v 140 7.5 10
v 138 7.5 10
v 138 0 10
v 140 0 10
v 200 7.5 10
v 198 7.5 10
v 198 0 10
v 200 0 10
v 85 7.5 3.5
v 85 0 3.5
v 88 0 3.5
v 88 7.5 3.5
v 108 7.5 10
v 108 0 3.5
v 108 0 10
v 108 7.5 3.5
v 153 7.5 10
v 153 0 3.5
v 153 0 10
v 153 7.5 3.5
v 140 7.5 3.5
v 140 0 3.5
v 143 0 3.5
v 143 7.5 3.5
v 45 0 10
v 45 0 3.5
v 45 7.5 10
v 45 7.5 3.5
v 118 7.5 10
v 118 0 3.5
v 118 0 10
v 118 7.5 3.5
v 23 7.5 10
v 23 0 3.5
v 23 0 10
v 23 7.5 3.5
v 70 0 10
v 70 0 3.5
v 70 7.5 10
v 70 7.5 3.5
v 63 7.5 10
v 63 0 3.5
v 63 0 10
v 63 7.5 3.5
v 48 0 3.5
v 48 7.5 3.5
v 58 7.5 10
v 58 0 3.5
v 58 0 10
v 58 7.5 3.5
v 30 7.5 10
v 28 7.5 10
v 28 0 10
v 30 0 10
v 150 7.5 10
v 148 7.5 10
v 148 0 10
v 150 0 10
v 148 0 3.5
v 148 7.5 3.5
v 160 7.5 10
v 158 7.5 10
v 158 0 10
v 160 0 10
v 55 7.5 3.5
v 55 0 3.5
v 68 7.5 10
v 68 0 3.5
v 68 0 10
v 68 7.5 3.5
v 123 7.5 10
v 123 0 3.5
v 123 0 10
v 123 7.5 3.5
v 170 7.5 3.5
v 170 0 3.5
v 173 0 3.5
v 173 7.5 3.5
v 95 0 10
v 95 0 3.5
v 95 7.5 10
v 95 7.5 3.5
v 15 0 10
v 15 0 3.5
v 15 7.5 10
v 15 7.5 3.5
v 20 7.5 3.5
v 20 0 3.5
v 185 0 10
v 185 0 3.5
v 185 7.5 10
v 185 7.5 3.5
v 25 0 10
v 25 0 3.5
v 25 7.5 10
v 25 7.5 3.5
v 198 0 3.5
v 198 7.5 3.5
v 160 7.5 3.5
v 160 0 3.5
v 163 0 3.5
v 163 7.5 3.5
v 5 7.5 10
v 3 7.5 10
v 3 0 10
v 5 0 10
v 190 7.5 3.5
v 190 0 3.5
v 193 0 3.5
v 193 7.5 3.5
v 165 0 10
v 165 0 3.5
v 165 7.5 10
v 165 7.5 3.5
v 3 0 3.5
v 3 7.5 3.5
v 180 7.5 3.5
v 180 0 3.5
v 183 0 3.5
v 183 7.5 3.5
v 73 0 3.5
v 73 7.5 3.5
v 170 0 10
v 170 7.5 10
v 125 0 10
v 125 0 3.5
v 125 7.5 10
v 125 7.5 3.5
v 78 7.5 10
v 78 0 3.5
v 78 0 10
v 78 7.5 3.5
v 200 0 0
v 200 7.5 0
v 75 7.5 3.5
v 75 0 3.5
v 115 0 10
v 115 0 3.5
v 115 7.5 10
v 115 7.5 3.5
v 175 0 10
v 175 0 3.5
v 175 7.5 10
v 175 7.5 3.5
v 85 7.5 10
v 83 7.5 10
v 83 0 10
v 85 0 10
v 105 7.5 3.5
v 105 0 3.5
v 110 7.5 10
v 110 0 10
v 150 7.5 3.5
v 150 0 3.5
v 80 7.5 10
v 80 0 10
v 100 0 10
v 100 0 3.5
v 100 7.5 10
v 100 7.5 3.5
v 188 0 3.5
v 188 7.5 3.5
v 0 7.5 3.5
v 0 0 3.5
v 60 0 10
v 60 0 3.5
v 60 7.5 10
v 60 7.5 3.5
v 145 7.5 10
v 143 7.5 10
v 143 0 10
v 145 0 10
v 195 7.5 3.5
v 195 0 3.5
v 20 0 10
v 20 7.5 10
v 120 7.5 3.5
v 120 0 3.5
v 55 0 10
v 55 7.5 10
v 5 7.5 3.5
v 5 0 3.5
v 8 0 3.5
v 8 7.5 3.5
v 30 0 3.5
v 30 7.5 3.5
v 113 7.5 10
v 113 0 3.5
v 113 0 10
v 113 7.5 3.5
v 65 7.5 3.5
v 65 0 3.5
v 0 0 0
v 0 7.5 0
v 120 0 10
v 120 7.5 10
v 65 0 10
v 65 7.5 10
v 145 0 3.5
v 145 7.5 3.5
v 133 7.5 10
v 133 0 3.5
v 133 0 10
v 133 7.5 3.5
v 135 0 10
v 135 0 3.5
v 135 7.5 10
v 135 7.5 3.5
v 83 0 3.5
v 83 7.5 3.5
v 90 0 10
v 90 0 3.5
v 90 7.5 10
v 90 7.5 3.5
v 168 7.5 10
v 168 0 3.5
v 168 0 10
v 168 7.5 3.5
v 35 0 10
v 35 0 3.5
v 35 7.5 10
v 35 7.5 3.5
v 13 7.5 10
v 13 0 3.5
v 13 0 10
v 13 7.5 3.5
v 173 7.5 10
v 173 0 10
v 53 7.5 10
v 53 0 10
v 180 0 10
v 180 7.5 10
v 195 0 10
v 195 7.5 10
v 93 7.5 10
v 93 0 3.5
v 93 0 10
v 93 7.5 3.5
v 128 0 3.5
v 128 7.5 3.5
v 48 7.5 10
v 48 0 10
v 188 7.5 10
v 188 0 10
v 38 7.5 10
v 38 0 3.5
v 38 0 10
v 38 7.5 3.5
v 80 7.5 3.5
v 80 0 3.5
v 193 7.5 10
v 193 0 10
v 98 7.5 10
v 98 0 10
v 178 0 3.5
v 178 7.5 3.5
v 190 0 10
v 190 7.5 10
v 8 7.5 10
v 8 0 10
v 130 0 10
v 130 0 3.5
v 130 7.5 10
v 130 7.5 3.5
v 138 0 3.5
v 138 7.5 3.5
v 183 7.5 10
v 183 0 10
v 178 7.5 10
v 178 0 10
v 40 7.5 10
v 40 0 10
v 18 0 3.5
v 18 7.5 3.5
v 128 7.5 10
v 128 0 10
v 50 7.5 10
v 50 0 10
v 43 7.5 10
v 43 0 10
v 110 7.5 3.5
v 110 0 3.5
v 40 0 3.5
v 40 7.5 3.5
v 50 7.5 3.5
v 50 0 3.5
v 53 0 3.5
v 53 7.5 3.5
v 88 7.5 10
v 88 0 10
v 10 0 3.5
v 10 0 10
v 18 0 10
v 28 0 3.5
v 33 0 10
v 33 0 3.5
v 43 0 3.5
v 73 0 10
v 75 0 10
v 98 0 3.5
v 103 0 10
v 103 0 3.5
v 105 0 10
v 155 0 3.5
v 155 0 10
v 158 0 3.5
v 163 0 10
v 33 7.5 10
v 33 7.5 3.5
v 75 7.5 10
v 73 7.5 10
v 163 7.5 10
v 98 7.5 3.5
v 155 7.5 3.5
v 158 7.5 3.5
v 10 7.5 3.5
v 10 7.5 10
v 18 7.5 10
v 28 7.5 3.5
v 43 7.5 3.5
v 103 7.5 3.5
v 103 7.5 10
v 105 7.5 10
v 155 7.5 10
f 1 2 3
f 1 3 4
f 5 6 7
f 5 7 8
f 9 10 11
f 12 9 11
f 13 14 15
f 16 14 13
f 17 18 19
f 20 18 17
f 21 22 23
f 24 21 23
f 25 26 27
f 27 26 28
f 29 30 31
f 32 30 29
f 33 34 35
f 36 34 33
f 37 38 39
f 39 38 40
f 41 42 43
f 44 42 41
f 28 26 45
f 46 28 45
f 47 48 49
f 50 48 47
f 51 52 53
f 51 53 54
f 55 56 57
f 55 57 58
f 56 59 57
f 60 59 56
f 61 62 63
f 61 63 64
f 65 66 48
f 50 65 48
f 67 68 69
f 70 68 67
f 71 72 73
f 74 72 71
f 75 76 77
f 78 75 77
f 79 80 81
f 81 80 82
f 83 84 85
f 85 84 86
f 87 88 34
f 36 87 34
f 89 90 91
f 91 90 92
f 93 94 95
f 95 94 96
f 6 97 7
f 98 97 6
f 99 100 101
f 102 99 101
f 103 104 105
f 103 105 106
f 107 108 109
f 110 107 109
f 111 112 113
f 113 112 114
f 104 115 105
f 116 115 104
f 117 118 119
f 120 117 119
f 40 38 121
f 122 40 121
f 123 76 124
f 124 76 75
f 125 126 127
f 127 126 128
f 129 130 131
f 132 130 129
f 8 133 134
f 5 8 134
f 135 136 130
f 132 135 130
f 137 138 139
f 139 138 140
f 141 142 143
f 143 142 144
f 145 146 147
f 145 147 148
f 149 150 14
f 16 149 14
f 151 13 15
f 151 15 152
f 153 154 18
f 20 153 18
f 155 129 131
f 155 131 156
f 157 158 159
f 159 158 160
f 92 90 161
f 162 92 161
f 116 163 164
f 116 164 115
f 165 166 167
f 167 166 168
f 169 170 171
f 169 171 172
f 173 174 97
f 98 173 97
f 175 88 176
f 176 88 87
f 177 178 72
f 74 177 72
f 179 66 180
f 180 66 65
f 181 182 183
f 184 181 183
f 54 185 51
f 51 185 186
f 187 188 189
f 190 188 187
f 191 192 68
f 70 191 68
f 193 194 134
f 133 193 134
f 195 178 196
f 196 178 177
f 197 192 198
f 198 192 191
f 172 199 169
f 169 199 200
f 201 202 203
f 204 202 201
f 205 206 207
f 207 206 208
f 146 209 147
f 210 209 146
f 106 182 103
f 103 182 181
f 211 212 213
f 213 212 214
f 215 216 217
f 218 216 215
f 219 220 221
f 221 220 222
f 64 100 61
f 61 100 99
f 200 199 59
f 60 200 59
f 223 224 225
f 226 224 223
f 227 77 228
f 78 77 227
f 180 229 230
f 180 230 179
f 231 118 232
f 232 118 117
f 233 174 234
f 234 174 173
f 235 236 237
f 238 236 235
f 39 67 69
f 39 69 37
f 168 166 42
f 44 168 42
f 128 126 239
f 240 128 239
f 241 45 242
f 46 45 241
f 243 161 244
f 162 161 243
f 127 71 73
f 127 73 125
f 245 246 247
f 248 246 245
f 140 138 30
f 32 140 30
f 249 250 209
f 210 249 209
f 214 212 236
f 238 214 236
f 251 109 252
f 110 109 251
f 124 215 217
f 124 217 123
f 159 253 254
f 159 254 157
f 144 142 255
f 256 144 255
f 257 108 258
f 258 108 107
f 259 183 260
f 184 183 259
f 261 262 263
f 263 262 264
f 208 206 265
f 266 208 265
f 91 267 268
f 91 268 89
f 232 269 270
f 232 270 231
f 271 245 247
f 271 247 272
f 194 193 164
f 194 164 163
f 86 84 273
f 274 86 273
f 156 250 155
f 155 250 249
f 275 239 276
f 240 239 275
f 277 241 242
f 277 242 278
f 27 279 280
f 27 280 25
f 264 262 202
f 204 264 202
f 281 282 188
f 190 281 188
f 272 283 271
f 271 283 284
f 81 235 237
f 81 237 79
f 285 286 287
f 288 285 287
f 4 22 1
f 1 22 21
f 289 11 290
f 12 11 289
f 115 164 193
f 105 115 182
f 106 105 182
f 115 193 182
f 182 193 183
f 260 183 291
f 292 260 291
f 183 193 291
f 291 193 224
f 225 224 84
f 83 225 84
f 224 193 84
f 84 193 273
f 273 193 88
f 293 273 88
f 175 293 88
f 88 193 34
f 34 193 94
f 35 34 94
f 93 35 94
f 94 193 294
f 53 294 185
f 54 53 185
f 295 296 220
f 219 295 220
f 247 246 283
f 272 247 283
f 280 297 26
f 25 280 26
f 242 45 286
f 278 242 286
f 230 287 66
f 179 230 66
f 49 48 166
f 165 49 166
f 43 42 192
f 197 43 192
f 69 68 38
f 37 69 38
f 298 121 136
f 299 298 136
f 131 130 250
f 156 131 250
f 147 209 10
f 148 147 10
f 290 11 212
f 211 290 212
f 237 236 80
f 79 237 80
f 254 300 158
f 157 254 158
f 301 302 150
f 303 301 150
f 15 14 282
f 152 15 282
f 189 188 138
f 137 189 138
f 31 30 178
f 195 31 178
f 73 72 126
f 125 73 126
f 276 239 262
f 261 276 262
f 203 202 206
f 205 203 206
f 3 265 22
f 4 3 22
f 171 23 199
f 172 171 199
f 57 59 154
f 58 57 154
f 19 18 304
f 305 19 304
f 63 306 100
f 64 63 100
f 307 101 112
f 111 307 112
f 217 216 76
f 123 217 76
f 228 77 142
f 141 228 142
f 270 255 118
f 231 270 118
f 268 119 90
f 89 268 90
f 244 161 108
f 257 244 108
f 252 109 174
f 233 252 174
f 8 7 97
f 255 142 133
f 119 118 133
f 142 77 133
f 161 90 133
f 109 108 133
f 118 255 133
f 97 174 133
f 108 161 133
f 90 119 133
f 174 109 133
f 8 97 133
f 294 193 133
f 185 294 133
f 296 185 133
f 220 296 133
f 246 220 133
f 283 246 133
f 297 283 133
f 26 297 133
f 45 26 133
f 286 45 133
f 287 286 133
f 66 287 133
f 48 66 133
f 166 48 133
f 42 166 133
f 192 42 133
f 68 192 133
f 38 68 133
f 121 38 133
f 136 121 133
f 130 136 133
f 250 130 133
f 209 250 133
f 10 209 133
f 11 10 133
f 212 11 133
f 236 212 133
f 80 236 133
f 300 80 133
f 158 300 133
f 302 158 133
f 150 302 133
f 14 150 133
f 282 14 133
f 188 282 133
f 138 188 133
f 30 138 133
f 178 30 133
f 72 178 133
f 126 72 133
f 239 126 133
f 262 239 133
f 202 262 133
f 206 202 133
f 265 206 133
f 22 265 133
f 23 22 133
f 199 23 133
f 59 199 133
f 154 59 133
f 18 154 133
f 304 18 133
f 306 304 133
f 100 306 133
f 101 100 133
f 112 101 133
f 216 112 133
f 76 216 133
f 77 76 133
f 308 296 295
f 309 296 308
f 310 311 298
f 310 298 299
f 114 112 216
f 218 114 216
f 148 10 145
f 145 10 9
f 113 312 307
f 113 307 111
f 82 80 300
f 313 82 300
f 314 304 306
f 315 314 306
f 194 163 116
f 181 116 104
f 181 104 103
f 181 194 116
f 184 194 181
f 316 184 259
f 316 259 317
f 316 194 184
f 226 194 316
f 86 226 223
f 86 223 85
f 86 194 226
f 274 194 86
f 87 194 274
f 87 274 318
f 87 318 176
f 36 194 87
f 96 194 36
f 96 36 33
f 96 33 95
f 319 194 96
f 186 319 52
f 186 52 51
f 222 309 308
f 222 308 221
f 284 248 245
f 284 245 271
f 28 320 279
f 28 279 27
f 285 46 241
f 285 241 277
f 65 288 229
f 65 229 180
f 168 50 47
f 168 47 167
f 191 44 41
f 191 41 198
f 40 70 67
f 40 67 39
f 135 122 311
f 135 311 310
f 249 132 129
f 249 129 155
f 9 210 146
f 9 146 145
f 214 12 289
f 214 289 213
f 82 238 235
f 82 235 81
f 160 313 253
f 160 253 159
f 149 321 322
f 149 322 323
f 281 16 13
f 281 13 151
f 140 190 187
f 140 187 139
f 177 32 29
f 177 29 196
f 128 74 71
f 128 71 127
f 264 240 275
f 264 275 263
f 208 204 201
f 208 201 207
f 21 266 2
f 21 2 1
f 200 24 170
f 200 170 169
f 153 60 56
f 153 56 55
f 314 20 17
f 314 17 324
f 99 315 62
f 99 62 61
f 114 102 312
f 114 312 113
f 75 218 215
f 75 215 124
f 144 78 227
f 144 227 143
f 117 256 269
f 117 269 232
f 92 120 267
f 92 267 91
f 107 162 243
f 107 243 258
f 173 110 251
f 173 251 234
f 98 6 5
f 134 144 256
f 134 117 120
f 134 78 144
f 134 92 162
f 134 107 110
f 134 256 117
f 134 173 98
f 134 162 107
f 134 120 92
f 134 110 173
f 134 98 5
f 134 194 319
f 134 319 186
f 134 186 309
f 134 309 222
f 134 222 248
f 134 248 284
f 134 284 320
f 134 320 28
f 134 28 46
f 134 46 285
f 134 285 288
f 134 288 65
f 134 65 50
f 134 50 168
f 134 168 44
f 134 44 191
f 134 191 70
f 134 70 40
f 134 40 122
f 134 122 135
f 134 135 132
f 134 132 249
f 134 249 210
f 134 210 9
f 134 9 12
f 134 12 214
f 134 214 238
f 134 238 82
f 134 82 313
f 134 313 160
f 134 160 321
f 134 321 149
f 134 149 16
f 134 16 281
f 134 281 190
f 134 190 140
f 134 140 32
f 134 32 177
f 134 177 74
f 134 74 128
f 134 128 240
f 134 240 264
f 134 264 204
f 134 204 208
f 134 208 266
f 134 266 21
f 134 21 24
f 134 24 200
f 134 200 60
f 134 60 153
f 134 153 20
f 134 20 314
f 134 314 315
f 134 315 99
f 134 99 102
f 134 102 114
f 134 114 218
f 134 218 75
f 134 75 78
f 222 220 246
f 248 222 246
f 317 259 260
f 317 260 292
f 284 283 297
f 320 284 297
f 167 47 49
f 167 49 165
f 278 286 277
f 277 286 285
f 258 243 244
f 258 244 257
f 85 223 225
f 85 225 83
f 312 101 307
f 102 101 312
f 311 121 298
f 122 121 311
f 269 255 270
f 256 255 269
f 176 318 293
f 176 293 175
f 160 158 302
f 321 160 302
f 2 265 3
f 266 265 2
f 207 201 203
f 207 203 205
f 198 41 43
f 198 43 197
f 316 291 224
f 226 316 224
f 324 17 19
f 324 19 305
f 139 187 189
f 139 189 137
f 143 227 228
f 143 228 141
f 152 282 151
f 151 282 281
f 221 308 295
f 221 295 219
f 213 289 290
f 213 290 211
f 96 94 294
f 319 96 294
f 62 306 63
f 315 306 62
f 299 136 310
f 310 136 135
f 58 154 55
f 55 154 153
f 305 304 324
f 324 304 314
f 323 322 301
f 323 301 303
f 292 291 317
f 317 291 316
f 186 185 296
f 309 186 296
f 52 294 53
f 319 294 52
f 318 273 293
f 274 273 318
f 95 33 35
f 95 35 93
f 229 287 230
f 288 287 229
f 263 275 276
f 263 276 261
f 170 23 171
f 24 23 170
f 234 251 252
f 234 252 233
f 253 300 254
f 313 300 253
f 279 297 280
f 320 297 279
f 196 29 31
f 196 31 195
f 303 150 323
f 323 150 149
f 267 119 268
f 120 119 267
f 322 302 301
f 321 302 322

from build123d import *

# Parameters (mm, degrees)
F0_W     = 3
F0_H     = 7.5
F1_DEPTH = 3.5
F0_W_2   = 2
F2_DEPTH = 10


with BuildPart() as f1:
    # F0 (on Top) → F1 (new body)
    with BuildSketch(Plane.XY):
        with Locations((1.5, 3.75)):
            Rectangle(F0_W, F0_H)
        with Locations((6.5, 3.75)):
            Rectangle(F0_W, F0_H)
        with Locations((11.5, 3.75)):
            Rectangle(F0_W, F0_H)
        with Locations((16.5, 3.75)):
            Rectangle(F0_W, F0_H)
        with Locations((21.5, 3.75)):
            Rectangle(F0_W, F0_H)
        with Locations((26.5, 3.75)):
            Rectangle(F0_W, F0_H)
        with Locations((31.5, 3.75)):
            Rectangle(F0_W, F0_H)
        with Locations((36.5, 3.75)):
            Rectangle(F0_W, F0_H)
        with Locations((41.5, 3.75)):
            Rectangle(F0_W, F0_H)
        with Locations((46.5, 3.75)):
            Rectangle(F0_W, F0_H)
        with Locations((51.5, 3.75)):
            Rectangle(F0_W, F0_H)
        with Locations((56.5, 3.75)):
            Rectangle(F0_W, F0_H)
        with Locations((61.5, 3.75)):
            Rectangle(F0_W, F0_H)
        with Locations((66.5, 3.75)):
            Rectangle(F0_W, F0_H)
        with Locations((71.5, 3.75)):
            Rectangle(F0_W, F0_H)
        with Locations((76.5, 3.75)):
            Rectangle(F0_W, F0_H)
        with Locations((81.5, 3.75)):
            Rectangle(F0_W, F0_H)
        with Locations((86.5, 3.75)):
            Rectangle(F0_W, F0_H)
        with Locations((91.5, 3.75)):
            Rectangle(F0_W, F0_H)
        with Locations((96.5, 3.75)):
            Rectangle(F0_W, F0_H)
        with Locations((101.5, 3.75)):
            Rectangle(F0_W, F0_H)
        with Locations((106.5, 3.75)):
            Rectangle(F0_W, F0_H)
        with Locations((111.5, 3.75)):
            Rectangle(F0_W, F0_H)
        with Locations((116.5, 3.75)):
            Rectangle(F0_W, F0_H)
        with Locations((121.5, 3.75)):
            Rectangle(F0_W, F0_H)
        with Locations((126.5, 3.75)):
            Rectangle(F0_W, F0_H)
        with Locations((131.5, 3.75)):
            Rectangle(F0_W, F0_H)
        with Locations((136.5, 3.75)):
            Rectangle(F0_W, F0_H)
        with Locations((141.5, 3.75)):
            Rectangle(F0_W, F0_H)
        with Locations((146.5, 3.75)):
            Rectangle(F0_W, F0_H)
        with Locations((151.5, 3.75)):
            Rectangle(F0_W, F0_H)
        with Locations((156.5, 3.75)):
            Rectangle(F0_W, F0_H)
        with Locations((161.5, 3.75)):
            Rectangle(F0_W, F0_H)
        with Locations((166.5, 3.75)):
            Rectangle(F0_W, F0_H)
        with Locations((171.5, 3.75)):
            Rectangle(F0_W, F0_H)
        with Locations((176.5, 3.75)):
            Rectangle(F0_W, F0_H)
        with Locations((181.5, 3.75)):
            Rectangle(F0_W, F0_H)
        with Locations((186.5, 3.75)):
            Rectangle(F0_W, F0_H)
        with Locations((191.5, 3.75)):
            Rectangle(F0_W, F0_H)
        with Locations((196.5, 3.75)):
            Rectangle(F0_W, F0_H)
    extrude(amount=F1_DEPTH)

    # F0 (on Top) → F2 (join)
    with BuildSketch(Plane.XY):
        with Locations((4, 3.75)):
            Rectangle(F0_W_2, F0_H)
        with Locations((9, 3.75)):
            Rectangle(F0_W_2, F0_H)
        with Locations((14, 3.75)):
            Rectangle(F0_W_2, F0_H)
        with Locations((19, 3.75)):
            Rectangle(F0_W_2, F0_H)
        with Locations((24, 3.75)):
            Rectangle(F0_W_2, F0_H)
        with Locations((29, 3.75)):
            Rectangle(F0_W_2, F0_H)
        with Locations((34, 3.75)):
            Rectangle(F0_W_2, F0_H)
        with Locations((39, 3.75)):
            Rectangle(F0_W_2, F0_H)
        with Locations((44, 3.75)):
            Rectangle(F0_W_2, F0_H)
        with Locations((49, 3.75)):
            Rectangle(F0_W_2, F0_H)
        with Locations((54, 3.75)):
            Rectangle(F0_W_2, F0_H)
        with Locations((59, 3.75)):
            Rectangle(F0_W_2, F0_H)
        with Locations((64, 3.75)):
            Rectangle(F0_W_2, F0_H)
        with Locations((69, 3.75)):
            Rectangle(F0_W_2, F0_H)
        with Locations((74, 3.75)):
            Rectangle(F0_W_2, F0_H)
        with Locations((79, 3.75)):
            Rectangle(F0_W_2, F0_H)
        with Locations((84, 3.75)):
            Rectangle(F0_W_2, F0_H)
        with Locations((89, 3.75)):
            Rectangle(F0_W_2, F0_H)
        with Locations((94, 3.75)):
            Rectangle(F0_W_2, F0_H)
        with Locations((99, 3.75)):
            Rectangle(F0_W_2, F0_H)
        with Locations((104, 3.75)):
            Rectangle(F0_W_2, F0_H)
        with Locations((109, 3.75)):
            Rectangle(F0_W_2, F0_H)
        with Locations((114, 3.75)):
            Rectangle(F0_W_2, F0_H)
        with Locations((119, 3.75)):
            Rectangle(F0_W_2, F0_H)
        with Locations((124, 3.75)):
            Rectangle(F0_W_2, F0_H)
        with Locations((129, 3.75)):
            Rectangle(F0_W_2, F0_H)
        with Locations((134, 3.75)):
            Rectangle(F0_W_2, F0_H)
        with Locations((139, 3.75)):
            Rectangle(F0_W_2, F0_H)
        with Locations((144, 3.75)):
            Rectangle(F0_W_2, F0_H)
        with Locations((149, 3.75)):
            Rectangle(F0_W_2, F0_H)
        with Locations((154, 3.75)):
            Rectangle(F0_W_2, F0_H)
        with Locations((159, 3.75)):
            Rectangle(F0_W_2, F0_H)
        with Locations((164, 3.75)):
            Rectangle(F0_W_2, F0_H)
        with Locations((169, 3.75)):
            Rectangle(F0_W_2, F0_H)
        with Locations((174, 3.75)):
            Rectangle(F0_W_2, F0_H)
        with Locations((179, 3.75)):
            Rectangle(F0_W_2, F0_H)
        with Locations((184, 3.75)):
            Rectangle(F0_W_2, F0_H)
        with Locations((189, 3.75)):
            Rectangle(F0_W_2, F0_H)
        with Locations((194, 3.75)):
            Rectangle(F0_W_2, F0_H)
        with Locations((199, 3.75)):
            Rectangle(F0_W_2, F0_H)
    extrude(amount=F2_DEPTH)


solid = f1.part
